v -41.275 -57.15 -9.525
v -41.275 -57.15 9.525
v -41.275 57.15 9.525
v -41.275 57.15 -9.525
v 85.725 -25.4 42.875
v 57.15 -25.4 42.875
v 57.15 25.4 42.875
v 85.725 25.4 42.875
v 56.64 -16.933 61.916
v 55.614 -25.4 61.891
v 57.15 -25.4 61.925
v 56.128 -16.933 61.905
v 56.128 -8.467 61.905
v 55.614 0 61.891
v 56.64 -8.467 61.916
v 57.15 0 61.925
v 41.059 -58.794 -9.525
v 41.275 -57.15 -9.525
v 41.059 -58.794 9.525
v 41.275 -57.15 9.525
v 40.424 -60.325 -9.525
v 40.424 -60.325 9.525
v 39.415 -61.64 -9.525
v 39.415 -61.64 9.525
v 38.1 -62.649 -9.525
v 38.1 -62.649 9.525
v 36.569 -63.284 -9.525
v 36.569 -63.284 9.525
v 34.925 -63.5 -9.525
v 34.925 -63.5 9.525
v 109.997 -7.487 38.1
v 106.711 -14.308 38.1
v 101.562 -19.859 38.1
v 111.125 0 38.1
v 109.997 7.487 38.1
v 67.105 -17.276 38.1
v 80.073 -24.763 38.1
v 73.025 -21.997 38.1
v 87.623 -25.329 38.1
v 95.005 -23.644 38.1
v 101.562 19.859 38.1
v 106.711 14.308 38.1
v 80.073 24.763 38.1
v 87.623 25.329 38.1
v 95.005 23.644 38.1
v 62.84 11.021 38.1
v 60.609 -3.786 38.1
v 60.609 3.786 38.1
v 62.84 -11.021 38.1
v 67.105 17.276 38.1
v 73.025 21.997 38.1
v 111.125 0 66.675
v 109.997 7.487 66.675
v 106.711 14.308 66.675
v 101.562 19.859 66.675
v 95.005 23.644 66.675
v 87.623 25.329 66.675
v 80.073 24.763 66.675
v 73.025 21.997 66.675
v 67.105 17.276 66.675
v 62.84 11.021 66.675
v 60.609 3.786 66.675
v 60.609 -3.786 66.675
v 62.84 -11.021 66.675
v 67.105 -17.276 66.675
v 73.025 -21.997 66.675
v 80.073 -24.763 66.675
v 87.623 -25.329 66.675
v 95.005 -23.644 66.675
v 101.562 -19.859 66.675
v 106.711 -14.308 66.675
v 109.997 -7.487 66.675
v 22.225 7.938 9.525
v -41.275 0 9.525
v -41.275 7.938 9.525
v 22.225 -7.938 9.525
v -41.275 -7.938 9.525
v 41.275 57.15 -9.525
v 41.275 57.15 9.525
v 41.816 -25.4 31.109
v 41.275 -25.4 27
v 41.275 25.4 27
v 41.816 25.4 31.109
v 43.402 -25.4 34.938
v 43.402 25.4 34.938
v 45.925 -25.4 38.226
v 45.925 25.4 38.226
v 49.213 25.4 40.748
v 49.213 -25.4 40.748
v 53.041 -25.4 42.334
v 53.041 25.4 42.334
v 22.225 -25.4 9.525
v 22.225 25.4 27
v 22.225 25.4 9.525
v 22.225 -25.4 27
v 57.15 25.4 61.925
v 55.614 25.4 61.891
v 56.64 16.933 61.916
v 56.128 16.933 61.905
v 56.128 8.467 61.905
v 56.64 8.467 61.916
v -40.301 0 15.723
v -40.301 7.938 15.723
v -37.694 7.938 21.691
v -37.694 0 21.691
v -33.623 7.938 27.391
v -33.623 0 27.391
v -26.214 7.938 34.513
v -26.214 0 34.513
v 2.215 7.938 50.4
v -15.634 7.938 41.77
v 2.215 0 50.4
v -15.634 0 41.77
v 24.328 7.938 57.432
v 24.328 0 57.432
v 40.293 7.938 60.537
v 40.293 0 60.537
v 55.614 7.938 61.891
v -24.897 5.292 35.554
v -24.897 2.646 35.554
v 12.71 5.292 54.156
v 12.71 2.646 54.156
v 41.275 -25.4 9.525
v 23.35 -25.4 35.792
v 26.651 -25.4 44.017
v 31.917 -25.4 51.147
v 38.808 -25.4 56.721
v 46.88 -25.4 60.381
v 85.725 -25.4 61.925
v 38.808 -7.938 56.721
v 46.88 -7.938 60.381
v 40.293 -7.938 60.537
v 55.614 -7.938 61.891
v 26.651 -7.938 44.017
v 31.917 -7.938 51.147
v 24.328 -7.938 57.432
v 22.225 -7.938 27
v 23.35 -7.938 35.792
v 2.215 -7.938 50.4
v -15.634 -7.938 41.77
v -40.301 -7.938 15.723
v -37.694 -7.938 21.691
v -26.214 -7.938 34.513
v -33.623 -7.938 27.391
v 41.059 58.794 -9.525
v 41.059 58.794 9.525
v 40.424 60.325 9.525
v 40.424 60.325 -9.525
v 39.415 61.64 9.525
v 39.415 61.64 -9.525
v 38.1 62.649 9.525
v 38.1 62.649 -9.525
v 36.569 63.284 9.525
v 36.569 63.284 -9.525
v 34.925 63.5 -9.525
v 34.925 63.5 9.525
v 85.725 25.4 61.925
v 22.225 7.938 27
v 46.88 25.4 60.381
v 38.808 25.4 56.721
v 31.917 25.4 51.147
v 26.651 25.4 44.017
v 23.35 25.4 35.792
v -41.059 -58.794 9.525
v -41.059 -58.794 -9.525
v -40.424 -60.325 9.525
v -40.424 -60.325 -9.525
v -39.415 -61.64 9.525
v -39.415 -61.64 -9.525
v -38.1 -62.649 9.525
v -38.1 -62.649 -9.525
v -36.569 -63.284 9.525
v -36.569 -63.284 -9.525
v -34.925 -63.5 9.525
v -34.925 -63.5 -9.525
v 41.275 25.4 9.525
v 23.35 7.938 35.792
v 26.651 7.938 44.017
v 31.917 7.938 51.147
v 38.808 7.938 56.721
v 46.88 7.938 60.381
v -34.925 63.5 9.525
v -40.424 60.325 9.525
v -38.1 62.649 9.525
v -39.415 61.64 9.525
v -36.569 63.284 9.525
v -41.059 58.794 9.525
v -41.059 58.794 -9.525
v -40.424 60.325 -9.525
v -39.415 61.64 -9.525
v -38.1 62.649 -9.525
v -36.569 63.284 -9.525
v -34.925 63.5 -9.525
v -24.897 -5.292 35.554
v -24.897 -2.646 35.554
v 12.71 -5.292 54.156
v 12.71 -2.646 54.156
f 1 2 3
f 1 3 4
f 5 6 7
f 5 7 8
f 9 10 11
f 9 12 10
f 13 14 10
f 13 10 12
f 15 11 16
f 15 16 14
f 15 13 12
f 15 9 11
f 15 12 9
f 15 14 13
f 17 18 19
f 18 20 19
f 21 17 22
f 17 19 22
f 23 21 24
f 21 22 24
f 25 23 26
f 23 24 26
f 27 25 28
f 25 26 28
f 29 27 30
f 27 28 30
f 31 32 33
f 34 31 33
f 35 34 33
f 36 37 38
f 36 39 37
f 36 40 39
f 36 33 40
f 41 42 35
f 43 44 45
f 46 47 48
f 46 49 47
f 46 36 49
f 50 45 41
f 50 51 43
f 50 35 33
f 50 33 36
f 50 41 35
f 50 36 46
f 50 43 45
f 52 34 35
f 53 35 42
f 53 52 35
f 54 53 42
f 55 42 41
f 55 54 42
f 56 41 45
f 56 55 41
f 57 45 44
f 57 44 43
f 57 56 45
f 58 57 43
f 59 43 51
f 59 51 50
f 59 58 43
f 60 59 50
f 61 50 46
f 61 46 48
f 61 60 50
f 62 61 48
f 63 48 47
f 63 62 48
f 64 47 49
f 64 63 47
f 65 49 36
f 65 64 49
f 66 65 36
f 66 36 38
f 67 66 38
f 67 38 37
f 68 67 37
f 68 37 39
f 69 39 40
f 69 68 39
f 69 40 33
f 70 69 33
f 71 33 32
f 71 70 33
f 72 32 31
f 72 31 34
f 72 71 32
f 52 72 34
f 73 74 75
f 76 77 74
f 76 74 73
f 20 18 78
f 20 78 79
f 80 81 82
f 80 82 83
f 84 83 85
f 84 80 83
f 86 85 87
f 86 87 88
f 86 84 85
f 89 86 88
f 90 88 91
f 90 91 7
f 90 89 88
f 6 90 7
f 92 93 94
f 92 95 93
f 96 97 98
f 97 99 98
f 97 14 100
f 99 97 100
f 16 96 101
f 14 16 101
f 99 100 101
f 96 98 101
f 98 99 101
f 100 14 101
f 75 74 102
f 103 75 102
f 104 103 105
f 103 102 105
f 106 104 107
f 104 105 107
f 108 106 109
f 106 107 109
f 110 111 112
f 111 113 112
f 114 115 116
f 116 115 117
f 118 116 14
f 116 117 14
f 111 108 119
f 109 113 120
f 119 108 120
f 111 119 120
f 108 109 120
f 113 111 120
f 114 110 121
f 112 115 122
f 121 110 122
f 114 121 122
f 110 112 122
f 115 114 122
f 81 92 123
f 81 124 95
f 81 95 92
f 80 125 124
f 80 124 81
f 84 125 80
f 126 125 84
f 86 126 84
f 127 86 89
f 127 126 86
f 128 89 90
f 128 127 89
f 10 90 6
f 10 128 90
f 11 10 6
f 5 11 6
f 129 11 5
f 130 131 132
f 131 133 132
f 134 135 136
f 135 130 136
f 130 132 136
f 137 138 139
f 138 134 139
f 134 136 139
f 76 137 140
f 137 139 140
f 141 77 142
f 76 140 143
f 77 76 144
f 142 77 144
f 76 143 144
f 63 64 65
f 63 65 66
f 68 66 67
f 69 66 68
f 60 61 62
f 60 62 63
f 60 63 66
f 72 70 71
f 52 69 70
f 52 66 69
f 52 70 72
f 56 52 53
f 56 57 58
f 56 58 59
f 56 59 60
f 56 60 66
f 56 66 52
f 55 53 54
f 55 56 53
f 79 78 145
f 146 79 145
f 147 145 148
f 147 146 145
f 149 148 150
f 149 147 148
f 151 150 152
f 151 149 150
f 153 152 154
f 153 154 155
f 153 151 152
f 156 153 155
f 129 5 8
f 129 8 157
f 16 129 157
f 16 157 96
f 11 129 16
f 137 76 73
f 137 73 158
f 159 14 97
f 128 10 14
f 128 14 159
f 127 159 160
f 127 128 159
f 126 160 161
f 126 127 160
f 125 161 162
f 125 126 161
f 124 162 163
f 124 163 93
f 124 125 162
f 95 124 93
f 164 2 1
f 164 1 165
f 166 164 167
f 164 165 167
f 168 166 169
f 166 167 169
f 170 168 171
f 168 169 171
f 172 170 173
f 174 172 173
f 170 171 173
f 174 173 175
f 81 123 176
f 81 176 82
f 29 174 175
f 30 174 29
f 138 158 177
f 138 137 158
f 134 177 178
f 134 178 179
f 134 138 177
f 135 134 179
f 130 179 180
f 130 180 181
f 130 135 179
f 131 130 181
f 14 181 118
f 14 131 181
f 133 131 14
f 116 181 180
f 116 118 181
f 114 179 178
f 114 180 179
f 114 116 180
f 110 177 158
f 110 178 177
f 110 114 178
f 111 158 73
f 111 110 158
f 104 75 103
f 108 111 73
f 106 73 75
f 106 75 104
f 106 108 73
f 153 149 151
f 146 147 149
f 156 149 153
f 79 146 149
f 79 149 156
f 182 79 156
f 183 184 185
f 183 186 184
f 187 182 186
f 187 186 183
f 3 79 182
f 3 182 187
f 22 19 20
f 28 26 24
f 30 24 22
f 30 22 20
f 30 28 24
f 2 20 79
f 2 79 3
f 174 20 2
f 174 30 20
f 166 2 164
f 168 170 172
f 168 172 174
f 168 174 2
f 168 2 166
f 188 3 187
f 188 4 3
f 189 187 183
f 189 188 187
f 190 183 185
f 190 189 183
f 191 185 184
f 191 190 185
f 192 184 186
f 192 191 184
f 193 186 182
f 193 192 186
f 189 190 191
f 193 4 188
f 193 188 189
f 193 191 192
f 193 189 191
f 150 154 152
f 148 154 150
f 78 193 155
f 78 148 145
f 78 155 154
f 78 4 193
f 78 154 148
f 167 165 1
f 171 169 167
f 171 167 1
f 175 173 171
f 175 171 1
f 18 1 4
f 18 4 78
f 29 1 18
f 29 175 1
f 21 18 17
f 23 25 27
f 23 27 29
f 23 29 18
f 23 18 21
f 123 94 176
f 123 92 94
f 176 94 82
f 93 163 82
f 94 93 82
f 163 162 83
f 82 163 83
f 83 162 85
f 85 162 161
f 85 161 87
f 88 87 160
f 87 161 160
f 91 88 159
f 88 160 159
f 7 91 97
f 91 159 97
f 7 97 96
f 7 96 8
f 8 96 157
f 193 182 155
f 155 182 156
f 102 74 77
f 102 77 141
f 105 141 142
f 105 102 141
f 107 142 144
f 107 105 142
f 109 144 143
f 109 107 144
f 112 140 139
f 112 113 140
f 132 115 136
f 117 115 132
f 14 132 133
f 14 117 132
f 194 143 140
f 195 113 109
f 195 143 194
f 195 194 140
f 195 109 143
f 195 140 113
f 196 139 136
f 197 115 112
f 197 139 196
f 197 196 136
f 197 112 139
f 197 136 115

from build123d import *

# Parameters (mm, degrees)
F1_DEPTH = 63.5
F0_W     = 25.4
F0_H     = 19.05
F2_DEPTH = 25.4
F3_DEPTH = 7.9375
F5_R     = 6.35


with BuildPart() as f1:
    # F0 (on Front) → F1 (new body, symmetric)
    with BuildSketch(Plane.XZ):
        Polygon((-41.275, 9.525), (-41.275, -9.525), (41.275, -9.525), (41.275, 9.525), (22.225, 9.525), align=None)
    extrude(amount=F1_DEPTH, both=True)

    # F5
    f5_edges = [f1.edges().sort_by_distance(p)[0] for p in [
        (41.275, -63.5, 0),
        (-41.275, -63.5, 0),
        (-41.275, 63.5, 0),
        (41.275, 63.5, 0),
    ]]
    fillet(f5_edges, radius=F5_R)


with BuildPart() as f2:
    # F0 (on Front) → F2 (new body, symmetric)
    with BuildSketch(Plane.XZ):
        with BuildLine():
            Line((22.225, 9.525), (41.275, 9.525))
            Line((41.275, 9.525), (41.275, 27.0002))
            ThreePointArc((41.275, 27.0002), (45.9246798487, 38.2255201513), (57.15, 42.8752))
            Line((57.15, 42.8752), (60.325, 42.8752))
            Line((60.325, 42.8752), (60.325, 61.9252))
            Line((60.325, 61.9252), (57.15, 61.9252))
            add(Edge.make_bspline(
                [(55.6137149679, 61.8913944952), (56.1284696287, 61.9061846013), (56.6406146507, 61.9174638983), (57.15, 61.9252)],
                knots=[110.0962575469, 110.0962575469, 110.0962575469, 110.0962575469, 111.5045361635, 111.5045361635, 111.5045361635, 111.5045361635], degree=3))
            ThreePointArc((55.6137149679, 61.8913944952), (31.9169821489, 51.1466373175), (22.225, 27.0002))
            Line((22.225, 27.0002), (22.225, 9.525))
        make_face()
        with Locations((73.025, 52.4002)):
            Rectangle(F0_W, F0_H)
    extrude(amount=F2_DEPTH, both=True)


with BuildPart() as f3:
    # F0 (on Front) → F3 (new body, symmetric)
    with BuildSketch(Plane.XZ):
        with BuildLine():
            add(Edge.make_bspline(
                [(-41.275, 9.525), (-40.8207025308, 38.1215714255), (15.371279249, 60.7351351358), (55.6137149679, 61.8913944952)],
                knots=[0, 0, 0, 0, 110.0962575469, 110.0962575469, 110.0962575469, 110.0962575469], degree=3))
            Line((-41.275, 9.525), (22.225, 9.525))
            Line((22.225, 9.525), (22.225, 27.0002))
            ThreePointArc((22.225, 27.0002), (31.9169821489, 51.1466373175), (55.6137149679, 61.8913944952))
        make_face()
    extrude(amount=F3_DEPTH, both=True)


with BuildPart() as f4:
    # F0 (on Front) → F4 (revolve)
    with BuildSketch(Plane.XZ):
        Polygon((85.725, 66.675), (85.725, 61.9252), (85.725, 42.8752), (85.725, 38.1), (111.125, 38.1), (111.125, 66.675), align=None)
    revolve(axis=Axis((85.725, 0, 52.3875), (0, 0, 1)))


solid = Compound([f1.part, f2.part, f3.part, f4.part])
